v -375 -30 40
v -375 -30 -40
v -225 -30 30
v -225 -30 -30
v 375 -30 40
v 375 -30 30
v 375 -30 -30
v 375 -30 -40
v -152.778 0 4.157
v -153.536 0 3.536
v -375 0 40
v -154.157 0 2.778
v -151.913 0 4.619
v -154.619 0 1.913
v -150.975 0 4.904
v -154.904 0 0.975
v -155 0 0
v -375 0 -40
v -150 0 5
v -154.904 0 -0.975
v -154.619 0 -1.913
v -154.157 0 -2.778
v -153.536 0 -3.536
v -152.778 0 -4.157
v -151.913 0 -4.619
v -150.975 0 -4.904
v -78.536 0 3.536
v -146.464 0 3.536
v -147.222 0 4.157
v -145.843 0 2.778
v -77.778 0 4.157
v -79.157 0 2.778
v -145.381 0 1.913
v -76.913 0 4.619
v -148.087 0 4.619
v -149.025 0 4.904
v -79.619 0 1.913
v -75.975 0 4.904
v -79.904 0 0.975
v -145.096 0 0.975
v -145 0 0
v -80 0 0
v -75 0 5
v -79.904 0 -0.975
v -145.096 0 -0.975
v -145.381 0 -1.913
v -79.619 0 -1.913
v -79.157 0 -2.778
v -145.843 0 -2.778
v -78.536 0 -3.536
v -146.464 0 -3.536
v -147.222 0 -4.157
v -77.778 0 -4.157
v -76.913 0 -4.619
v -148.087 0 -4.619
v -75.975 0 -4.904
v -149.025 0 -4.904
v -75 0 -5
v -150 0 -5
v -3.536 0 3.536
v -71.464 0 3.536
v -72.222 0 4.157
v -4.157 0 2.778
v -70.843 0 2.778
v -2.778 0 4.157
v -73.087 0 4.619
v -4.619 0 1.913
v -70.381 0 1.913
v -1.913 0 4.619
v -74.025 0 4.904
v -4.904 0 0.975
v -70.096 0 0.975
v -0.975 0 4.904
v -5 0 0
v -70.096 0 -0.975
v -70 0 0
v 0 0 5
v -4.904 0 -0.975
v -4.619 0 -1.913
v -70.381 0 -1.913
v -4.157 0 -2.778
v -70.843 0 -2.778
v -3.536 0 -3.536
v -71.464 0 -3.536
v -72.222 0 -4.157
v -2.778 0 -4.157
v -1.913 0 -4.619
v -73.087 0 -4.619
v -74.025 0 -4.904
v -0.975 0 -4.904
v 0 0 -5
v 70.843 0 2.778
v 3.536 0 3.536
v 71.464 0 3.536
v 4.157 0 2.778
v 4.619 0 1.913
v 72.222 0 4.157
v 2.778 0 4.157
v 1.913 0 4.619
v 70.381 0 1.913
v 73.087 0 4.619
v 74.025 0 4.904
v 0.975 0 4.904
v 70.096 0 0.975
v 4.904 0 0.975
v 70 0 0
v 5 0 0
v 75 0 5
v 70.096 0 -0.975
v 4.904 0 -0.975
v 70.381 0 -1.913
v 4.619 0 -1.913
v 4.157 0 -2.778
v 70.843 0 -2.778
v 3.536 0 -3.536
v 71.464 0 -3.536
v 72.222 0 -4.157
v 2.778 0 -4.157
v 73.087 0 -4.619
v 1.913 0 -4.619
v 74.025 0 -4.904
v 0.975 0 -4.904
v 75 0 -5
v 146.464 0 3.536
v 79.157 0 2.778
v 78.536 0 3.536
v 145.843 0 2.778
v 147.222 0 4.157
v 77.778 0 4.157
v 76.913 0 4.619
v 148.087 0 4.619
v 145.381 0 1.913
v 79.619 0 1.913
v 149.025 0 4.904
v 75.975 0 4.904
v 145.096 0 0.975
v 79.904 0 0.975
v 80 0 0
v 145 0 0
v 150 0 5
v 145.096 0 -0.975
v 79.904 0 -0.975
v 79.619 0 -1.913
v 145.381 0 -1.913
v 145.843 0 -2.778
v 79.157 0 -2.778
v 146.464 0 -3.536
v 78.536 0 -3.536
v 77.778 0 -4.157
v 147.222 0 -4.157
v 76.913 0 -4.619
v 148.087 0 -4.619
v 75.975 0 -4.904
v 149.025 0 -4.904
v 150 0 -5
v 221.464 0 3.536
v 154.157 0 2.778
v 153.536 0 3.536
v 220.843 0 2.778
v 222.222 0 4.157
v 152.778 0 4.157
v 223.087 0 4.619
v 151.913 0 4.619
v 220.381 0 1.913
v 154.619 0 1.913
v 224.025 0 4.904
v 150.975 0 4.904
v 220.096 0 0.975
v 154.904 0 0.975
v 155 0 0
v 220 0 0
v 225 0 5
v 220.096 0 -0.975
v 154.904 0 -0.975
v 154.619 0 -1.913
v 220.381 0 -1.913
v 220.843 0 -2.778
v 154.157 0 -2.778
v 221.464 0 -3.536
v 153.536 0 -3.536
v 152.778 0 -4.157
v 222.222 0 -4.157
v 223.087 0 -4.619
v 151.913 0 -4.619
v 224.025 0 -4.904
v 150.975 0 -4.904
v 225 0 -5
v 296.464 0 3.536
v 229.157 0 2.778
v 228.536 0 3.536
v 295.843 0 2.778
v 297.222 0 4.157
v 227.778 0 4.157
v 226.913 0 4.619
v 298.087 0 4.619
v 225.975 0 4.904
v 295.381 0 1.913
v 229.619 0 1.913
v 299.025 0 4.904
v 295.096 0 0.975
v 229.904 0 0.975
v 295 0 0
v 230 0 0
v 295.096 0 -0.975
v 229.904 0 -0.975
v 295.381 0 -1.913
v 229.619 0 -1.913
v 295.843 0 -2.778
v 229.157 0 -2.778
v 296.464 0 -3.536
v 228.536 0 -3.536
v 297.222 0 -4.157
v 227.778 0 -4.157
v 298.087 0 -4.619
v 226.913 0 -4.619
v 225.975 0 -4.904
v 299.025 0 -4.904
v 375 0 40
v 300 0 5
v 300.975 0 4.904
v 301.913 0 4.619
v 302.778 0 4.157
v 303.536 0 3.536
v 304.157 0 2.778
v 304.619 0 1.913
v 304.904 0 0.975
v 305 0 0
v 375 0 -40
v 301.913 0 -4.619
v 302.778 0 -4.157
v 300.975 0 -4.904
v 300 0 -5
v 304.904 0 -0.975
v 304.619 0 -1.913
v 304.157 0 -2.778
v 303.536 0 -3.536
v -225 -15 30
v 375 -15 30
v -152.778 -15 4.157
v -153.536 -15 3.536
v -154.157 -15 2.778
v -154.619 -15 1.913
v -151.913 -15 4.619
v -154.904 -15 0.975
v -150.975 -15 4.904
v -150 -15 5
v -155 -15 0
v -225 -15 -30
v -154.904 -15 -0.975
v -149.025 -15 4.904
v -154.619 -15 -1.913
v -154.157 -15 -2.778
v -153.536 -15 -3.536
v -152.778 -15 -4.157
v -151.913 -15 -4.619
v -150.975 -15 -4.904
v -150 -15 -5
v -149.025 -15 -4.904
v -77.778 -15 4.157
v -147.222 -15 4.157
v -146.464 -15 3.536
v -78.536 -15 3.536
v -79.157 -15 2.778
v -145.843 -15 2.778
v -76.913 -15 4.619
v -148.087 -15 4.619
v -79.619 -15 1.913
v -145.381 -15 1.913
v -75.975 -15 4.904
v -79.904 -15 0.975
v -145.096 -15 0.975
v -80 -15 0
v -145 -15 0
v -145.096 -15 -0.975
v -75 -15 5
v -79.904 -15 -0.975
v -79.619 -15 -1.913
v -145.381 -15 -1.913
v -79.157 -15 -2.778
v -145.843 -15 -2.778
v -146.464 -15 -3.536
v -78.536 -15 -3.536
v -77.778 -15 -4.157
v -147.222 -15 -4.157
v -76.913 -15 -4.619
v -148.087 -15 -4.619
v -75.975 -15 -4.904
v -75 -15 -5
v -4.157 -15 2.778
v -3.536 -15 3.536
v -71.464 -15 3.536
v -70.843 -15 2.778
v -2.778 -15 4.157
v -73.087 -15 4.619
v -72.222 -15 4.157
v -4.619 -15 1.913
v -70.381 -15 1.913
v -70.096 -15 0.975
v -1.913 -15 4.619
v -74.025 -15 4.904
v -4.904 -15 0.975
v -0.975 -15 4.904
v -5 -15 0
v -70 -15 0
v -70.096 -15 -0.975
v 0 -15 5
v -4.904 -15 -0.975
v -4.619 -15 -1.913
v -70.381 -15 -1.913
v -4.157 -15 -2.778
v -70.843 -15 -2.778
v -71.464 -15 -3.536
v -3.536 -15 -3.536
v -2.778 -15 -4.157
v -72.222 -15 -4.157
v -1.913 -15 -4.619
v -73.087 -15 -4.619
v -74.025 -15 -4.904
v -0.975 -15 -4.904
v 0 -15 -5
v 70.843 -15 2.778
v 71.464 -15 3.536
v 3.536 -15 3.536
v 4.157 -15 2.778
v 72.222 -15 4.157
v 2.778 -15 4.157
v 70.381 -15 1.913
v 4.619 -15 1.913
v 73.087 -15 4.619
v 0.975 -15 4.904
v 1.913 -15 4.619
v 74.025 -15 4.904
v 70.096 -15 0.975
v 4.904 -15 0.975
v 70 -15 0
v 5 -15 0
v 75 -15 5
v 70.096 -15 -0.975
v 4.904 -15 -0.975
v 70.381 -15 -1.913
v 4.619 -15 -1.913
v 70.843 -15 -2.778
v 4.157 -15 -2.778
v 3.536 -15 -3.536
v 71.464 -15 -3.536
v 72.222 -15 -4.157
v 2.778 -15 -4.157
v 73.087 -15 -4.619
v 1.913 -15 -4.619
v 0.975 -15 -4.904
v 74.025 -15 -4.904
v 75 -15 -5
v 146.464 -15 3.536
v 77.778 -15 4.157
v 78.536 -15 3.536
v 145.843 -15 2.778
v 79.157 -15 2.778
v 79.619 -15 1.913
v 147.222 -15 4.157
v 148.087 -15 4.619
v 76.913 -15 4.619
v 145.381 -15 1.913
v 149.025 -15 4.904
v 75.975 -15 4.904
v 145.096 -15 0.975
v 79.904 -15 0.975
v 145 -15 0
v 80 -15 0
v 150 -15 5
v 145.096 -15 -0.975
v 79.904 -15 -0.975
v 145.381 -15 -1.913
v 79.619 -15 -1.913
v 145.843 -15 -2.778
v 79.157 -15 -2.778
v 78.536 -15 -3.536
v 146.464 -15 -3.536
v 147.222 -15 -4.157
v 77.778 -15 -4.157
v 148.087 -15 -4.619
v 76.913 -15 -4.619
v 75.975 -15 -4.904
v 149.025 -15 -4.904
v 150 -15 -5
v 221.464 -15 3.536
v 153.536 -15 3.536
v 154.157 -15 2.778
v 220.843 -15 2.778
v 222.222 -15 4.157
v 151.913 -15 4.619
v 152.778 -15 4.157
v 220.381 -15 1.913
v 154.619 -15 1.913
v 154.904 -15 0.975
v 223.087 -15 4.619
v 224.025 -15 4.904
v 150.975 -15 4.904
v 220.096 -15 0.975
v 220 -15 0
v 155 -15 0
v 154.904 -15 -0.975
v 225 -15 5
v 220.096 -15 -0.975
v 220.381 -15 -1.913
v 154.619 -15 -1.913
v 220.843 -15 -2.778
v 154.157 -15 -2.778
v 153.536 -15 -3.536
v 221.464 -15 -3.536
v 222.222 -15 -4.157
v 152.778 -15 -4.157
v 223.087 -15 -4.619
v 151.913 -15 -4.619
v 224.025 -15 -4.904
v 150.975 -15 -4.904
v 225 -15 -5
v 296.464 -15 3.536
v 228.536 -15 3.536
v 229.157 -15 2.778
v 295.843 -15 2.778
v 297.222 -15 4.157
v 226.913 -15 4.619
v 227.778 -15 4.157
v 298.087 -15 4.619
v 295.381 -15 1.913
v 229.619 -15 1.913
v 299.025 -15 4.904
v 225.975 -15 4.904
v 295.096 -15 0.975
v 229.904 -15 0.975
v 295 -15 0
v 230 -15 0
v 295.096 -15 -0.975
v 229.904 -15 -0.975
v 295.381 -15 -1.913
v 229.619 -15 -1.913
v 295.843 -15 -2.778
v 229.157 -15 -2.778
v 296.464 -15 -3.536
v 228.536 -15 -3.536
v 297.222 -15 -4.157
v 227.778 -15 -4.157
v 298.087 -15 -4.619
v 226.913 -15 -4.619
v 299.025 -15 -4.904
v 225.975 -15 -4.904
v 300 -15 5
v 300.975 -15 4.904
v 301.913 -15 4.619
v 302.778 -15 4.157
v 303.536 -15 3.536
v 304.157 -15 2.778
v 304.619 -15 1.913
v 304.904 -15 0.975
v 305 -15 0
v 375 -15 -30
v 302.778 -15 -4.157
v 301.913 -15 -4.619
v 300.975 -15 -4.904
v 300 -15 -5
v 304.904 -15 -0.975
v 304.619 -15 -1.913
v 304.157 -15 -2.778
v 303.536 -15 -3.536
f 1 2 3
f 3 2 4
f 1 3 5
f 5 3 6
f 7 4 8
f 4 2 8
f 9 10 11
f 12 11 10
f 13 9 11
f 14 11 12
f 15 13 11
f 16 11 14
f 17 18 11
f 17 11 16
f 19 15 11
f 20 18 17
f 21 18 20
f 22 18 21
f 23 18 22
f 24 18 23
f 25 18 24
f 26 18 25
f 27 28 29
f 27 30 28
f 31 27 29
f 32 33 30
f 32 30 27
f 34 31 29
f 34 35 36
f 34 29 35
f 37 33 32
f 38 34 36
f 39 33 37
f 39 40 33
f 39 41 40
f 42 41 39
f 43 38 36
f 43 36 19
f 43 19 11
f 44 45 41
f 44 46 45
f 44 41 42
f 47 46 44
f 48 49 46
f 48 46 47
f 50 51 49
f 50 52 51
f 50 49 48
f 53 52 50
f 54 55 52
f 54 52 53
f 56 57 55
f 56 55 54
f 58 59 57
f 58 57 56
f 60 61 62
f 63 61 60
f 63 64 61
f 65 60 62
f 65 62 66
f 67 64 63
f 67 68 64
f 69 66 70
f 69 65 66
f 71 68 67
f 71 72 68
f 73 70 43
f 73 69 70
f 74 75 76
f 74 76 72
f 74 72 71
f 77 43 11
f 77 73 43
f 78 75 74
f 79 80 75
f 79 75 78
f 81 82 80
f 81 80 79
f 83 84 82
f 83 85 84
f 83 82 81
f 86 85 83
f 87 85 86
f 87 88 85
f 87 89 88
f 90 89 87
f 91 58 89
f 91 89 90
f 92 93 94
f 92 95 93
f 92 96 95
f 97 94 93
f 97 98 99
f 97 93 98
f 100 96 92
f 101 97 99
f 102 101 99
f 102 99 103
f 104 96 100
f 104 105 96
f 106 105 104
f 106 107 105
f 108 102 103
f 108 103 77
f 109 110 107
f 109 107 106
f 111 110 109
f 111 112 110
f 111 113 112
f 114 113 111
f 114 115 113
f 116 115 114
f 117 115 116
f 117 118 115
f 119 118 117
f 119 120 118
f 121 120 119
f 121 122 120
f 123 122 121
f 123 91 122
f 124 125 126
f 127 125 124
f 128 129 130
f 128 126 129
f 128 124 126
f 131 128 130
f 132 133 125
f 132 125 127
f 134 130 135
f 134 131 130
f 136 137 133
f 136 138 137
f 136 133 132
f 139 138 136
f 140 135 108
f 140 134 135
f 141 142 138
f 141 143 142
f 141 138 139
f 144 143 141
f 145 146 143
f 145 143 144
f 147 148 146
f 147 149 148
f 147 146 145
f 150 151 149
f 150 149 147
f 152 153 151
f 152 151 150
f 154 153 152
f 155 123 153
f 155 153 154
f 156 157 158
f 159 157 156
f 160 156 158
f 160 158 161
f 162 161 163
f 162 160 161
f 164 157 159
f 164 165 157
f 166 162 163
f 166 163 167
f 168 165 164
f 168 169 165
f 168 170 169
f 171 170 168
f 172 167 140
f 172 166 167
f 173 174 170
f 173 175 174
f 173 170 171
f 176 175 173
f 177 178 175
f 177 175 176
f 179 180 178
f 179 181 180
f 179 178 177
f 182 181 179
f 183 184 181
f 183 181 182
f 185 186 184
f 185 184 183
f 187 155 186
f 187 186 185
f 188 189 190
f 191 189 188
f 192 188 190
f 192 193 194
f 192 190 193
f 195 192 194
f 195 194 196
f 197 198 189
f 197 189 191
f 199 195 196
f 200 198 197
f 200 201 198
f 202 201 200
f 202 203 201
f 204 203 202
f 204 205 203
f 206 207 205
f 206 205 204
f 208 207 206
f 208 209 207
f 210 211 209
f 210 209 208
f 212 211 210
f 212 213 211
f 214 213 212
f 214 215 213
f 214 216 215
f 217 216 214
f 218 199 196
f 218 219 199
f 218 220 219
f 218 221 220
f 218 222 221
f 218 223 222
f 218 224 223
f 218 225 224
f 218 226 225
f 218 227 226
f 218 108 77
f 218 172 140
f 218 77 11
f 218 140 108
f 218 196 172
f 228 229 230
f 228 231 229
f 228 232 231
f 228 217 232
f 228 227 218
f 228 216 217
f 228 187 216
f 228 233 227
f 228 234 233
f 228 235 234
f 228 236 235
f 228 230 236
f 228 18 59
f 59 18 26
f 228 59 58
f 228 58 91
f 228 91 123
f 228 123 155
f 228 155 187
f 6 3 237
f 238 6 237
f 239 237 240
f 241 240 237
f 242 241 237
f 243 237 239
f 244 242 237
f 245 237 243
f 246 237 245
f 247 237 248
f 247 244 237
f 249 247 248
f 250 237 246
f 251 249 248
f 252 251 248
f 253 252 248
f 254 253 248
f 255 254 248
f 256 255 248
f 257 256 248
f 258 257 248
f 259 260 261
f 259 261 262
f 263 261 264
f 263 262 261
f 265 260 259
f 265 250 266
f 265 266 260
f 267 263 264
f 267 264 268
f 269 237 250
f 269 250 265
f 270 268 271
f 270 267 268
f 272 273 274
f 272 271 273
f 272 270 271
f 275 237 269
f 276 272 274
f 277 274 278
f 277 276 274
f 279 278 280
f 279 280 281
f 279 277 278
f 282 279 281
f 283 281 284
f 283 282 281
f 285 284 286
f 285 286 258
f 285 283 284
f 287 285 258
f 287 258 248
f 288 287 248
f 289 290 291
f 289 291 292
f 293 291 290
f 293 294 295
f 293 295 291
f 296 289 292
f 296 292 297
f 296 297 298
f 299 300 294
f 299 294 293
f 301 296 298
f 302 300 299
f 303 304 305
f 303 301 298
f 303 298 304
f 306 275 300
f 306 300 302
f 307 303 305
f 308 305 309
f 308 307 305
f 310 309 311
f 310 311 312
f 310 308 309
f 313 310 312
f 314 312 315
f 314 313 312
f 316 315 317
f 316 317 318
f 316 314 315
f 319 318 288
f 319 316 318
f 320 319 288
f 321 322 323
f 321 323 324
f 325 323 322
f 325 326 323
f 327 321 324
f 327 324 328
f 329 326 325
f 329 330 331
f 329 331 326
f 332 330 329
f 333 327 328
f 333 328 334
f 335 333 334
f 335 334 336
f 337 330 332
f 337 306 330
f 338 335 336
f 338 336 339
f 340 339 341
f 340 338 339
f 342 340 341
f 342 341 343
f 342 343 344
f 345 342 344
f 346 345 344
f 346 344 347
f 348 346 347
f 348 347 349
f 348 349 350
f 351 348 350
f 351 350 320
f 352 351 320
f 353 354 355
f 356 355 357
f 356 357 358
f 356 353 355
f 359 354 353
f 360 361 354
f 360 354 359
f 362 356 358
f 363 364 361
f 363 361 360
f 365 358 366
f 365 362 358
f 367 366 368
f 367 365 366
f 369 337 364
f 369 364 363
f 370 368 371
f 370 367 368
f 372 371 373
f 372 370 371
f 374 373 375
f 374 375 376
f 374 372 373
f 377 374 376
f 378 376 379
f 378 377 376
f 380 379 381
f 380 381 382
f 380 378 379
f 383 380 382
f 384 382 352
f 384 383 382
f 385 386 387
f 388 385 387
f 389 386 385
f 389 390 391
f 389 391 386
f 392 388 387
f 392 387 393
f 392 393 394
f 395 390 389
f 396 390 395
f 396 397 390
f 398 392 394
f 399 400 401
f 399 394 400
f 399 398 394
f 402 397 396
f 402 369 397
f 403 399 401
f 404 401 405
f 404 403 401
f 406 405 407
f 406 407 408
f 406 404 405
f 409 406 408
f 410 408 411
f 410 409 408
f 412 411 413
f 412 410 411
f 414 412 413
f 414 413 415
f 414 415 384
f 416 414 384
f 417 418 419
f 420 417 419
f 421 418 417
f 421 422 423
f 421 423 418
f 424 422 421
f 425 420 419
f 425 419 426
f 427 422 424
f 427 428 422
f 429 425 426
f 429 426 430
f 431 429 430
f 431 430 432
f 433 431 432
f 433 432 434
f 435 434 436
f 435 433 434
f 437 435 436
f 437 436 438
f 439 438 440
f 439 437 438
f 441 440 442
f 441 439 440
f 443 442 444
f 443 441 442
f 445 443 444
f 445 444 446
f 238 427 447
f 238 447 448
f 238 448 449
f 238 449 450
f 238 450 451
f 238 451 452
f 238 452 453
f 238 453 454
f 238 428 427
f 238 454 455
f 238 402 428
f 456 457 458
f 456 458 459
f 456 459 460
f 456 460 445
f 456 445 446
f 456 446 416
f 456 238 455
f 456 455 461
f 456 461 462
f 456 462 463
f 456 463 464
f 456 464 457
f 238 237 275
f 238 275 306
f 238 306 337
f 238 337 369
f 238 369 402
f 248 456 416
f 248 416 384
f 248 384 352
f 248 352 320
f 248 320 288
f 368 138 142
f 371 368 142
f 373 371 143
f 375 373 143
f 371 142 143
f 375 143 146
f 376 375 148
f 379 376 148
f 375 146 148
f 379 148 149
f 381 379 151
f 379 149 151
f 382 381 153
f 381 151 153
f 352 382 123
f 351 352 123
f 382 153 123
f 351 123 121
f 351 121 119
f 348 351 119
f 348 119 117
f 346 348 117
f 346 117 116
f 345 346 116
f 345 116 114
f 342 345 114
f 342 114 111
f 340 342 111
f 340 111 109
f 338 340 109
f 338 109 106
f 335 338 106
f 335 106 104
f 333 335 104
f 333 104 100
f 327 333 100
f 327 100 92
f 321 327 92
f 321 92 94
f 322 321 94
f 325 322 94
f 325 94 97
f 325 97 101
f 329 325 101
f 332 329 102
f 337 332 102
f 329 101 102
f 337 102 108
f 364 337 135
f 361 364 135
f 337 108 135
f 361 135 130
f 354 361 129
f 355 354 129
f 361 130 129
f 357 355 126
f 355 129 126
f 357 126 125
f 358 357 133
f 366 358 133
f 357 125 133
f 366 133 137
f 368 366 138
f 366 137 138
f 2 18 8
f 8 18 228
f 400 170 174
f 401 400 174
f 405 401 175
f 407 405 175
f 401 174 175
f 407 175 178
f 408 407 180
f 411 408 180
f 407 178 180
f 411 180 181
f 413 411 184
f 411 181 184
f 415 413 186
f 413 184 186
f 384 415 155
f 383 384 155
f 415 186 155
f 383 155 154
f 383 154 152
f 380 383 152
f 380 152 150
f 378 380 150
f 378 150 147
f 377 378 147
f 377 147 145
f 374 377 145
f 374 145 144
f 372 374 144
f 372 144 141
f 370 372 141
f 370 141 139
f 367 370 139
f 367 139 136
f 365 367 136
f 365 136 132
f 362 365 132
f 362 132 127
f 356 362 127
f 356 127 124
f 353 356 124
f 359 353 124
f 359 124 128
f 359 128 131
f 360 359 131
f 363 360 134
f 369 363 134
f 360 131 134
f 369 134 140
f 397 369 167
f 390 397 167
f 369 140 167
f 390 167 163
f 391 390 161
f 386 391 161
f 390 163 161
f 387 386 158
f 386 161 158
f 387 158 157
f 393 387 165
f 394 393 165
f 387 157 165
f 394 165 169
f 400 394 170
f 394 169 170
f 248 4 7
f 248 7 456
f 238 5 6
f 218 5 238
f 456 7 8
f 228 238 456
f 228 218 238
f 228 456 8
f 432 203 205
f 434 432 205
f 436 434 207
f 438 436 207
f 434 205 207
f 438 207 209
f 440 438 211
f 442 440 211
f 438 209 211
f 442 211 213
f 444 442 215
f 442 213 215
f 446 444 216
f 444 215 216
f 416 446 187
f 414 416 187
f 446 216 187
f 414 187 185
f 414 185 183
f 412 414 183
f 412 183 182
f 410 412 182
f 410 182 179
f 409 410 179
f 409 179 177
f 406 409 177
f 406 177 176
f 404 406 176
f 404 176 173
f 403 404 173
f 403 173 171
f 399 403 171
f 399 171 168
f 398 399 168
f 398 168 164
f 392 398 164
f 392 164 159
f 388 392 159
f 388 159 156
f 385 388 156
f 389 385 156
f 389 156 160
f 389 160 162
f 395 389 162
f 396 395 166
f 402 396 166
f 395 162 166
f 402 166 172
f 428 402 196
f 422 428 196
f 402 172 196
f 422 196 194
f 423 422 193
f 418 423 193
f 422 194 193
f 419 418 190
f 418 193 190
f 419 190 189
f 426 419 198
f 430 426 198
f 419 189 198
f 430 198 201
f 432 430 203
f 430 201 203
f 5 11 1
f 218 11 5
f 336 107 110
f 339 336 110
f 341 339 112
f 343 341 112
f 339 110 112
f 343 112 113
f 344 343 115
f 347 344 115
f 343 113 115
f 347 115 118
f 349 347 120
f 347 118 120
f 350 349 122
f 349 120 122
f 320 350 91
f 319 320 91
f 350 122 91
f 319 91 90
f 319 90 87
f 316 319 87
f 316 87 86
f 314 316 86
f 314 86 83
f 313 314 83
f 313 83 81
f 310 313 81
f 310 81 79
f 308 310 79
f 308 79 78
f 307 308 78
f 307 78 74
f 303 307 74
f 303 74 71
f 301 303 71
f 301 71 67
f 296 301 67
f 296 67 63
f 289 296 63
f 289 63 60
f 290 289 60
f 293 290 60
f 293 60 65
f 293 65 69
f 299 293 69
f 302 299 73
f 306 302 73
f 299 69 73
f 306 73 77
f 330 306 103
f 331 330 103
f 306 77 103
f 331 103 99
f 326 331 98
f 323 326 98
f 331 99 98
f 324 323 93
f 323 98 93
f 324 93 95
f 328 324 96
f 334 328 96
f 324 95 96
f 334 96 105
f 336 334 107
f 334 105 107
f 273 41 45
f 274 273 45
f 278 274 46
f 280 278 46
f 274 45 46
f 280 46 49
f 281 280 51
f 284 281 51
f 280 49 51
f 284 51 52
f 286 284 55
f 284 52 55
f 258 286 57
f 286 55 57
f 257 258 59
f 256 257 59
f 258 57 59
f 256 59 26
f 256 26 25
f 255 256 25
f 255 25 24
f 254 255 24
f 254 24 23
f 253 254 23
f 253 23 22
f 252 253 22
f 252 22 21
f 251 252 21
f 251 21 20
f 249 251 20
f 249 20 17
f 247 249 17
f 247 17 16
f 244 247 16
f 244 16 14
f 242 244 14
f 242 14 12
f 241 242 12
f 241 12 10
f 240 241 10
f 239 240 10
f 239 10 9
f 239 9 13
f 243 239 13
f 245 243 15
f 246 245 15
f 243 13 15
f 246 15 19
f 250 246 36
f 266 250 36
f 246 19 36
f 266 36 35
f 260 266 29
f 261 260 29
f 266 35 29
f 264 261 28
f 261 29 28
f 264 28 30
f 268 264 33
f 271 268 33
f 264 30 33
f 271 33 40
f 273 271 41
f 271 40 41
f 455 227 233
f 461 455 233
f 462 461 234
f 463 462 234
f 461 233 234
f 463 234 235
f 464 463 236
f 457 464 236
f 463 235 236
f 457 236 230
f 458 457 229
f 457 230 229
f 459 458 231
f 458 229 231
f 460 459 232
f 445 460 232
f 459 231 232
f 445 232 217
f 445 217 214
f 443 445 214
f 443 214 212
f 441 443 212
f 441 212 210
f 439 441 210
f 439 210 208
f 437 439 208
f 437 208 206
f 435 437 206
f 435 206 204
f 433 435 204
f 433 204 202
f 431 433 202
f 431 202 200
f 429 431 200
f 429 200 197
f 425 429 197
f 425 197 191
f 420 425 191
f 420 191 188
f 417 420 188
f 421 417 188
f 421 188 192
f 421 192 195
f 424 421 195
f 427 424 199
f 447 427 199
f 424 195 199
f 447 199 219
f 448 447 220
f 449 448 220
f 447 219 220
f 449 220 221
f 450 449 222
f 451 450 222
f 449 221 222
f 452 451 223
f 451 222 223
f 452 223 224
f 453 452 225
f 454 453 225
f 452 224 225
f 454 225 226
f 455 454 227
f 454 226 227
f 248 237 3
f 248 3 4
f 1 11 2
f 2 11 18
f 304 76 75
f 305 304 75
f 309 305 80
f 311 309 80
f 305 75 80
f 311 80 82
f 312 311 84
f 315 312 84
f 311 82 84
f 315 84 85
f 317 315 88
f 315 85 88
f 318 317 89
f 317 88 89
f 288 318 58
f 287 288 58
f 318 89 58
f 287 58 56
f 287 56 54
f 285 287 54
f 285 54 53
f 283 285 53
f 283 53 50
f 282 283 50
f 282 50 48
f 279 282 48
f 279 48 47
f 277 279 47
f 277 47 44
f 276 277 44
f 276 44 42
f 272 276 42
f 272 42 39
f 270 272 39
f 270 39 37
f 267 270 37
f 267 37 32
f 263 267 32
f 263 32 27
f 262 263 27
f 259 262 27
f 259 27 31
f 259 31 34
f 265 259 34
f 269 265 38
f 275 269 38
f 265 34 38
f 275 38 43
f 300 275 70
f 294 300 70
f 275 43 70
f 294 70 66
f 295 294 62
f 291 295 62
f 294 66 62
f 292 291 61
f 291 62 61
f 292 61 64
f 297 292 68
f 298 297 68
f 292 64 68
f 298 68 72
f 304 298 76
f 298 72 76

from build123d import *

# Parameters (mm, degrees)
IZIM2_W                     = 750
IZIM2_H                     = 80
IZIM2_R                     = 5
Y_KSEKLIK_EKSTR_ZYON1_DEPTH = 30
IZIM3_W                     = 60
IZIM3_H                     = 15
KES_EKSTR_ZYON1_DEPTH       = 600


with BuildPart() as part:
    # Çizim2 → Yükseklik-Ekstrüzyon1 (new body)
    with BuildSketch(Plane(origin=(0, 0, 0), x_dir=(1, 0, 0), z_dir=(0, 1, 0))):
        Rectangle(IZIM2_W, IZIM2_H)
        with Locations((300, 0)):
            Circle(IZIM2_R, mode=Mode.SUBTRACT)
        with Locations((225, 0)):
            Circle(IZIM2_R, mode=Mode.SUBTRACT)
        with Locations((150, 0)):
            Circle(IZIM2_R, mode=Mode.SUBTRACT)
        with Locations((75, 0)):
            Circle(IZIM2_R, mode=Mode.SUBTRACT)
        Circle(IZIM2_R, mode=Mode.SUBTRACT)
        with Locations((-75, 0)):
            Circle(IZIM2_R, mode=Mode.SUBTRACT)
        with Locations((-150, 0)):
            Circle(IZIM2_R, mode=Mode.SUBTRACT)
    extrude(amount=-Y_KSEKLIK_EKSTR_ZYON1_DEPTH)

    # Çizim3 → Kes-Ekstrüzyon1 (cut)
    with BuildSketch(Plane(origin=(375, 0, 0), x_dir=(0, 0, -1), z_dir=(1, 0, 0))):
        with Locations((0, -22.5)):
            Rectangle(IZIM3_W, IZIM3_H)
    extrude(amount=-KES_EKSTR_ZYON1_DEPTH, mode=Mode.SUBTRACT)


solid = part.part
